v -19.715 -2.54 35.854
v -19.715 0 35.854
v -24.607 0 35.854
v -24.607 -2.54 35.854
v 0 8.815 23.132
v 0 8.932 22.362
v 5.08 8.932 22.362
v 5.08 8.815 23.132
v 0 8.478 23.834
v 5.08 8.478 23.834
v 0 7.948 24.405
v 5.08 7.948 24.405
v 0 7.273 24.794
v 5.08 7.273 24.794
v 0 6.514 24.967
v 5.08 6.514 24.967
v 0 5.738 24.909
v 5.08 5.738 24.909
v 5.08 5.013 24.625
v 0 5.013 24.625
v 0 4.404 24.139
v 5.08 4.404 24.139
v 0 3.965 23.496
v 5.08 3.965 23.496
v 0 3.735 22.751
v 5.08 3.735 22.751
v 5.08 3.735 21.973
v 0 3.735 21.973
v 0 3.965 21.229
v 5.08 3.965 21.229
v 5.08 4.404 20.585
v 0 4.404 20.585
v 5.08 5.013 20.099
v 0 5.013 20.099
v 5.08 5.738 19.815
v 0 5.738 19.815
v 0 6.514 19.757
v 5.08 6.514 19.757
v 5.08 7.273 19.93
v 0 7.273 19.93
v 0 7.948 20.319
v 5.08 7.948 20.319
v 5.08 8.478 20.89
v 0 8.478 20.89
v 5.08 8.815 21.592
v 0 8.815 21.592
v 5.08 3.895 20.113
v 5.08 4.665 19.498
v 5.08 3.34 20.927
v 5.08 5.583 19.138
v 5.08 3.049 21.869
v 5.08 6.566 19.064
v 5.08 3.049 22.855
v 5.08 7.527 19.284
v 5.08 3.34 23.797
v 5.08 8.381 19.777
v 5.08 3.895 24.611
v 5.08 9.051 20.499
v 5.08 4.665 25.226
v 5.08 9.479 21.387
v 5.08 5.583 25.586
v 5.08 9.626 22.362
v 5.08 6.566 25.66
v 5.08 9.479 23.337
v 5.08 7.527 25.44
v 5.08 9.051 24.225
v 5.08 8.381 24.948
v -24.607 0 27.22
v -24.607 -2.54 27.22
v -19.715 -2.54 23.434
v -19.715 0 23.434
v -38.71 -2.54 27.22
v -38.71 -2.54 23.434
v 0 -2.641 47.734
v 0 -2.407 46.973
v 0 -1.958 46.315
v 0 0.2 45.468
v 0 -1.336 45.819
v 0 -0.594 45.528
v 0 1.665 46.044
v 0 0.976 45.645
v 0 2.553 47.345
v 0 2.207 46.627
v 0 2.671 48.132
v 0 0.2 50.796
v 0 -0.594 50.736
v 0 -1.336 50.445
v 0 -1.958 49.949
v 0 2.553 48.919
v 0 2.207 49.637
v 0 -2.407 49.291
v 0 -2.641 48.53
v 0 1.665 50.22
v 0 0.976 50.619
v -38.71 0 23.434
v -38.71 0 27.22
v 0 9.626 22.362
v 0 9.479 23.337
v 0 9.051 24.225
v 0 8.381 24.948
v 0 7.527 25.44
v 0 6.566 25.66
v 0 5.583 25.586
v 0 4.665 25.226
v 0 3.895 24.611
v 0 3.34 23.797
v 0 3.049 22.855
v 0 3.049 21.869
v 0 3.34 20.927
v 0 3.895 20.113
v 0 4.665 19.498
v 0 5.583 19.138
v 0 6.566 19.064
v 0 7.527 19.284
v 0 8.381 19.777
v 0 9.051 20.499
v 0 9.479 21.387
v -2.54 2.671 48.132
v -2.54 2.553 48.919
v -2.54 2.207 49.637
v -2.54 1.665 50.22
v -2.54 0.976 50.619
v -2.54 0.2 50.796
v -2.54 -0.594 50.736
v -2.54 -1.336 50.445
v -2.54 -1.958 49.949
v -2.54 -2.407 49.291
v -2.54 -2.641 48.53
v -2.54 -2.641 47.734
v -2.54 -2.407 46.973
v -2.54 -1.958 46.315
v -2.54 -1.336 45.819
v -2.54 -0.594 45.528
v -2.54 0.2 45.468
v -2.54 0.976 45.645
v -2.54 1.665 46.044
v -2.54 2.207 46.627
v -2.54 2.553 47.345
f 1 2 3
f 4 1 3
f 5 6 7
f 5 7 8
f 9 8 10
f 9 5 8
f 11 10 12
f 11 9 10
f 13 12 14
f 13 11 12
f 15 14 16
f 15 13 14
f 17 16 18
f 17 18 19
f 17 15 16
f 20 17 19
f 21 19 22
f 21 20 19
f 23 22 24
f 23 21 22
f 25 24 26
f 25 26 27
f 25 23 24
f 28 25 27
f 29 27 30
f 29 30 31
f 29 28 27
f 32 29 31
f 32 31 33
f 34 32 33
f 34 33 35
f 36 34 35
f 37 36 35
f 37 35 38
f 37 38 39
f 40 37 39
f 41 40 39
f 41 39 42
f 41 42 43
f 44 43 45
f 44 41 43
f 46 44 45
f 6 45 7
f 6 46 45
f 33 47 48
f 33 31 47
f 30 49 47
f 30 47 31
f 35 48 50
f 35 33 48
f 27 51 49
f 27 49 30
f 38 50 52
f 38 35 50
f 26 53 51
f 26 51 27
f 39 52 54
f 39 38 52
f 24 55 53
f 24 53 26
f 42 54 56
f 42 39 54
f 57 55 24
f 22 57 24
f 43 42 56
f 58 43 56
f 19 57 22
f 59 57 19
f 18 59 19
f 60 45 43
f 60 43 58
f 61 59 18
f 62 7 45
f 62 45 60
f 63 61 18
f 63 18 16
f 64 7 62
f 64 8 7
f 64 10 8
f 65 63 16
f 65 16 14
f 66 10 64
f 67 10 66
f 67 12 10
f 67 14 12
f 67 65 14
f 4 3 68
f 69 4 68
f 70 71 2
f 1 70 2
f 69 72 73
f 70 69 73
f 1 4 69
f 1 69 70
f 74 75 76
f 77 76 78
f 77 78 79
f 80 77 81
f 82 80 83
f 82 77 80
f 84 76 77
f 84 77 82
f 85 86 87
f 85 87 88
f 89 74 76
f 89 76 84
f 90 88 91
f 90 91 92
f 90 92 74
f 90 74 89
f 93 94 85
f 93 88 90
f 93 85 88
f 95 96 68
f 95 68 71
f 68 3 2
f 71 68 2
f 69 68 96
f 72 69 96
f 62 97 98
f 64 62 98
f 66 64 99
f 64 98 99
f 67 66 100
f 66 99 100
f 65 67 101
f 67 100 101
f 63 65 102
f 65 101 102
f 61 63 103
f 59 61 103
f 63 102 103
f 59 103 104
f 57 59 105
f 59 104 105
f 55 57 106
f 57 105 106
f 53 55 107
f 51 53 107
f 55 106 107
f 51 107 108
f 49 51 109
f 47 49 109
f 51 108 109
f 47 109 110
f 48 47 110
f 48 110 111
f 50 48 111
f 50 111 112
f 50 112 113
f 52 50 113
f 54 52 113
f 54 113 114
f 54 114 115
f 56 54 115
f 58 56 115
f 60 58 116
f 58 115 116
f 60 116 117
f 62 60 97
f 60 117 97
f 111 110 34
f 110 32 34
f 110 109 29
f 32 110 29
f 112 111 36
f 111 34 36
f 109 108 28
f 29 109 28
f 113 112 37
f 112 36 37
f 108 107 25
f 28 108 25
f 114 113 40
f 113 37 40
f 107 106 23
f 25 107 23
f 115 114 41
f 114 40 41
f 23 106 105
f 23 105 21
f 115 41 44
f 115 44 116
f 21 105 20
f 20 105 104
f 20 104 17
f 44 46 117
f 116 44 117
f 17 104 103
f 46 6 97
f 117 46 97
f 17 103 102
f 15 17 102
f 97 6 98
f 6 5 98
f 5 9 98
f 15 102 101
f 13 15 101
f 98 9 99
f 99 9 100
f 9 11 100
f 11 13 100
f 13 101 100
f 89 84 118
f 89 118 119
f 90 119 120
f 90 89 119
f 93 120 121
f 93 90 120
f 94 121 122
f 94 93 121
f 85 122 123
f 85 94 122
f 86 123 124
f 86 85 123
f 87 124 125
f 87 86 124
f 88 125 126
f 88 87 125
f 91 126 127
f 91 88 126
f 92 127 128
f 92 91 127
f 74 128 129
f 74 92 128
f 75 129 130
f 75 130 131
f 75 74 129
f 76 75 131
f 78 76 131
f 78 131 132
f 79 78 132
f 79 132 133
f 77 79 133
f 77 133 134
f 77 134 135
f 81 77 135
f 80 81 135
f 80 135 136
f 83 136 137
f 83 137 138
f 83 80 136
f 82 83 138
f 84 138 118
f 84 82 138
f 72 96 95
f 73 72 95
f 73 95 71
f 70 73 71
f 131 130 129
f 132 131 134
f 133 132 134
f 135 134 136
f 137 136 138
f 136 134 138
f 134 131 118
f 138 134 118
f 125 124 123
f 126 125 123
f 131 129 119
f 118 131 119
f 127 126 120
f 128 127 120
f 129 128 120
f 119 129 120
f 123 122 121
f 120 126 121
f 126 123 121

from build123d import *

# Parameters (mm, degrees)
F1_DEPTH = 2.54
F2_R     = 2.671203
F3_DEPTH = 2.54
F4_R     = 3.306854
F4_R_2   = 2.612631
F5_DEPTH = 5.08


with BuildPart() as f1:
    # F0 (on Front) → F1 (new body)
    with BuildSketch(Plane.XZ):
        Polygon((-38.709875, 27.219653), (-38.709875, 23.43416), (-19.714694, 23.43416), (-19.714694, 35.853826), (-24.607392, 35.853826), (-24.607392, 31.248933), (-24.607392, 27.219653), align=None)
    extrude(amount=F1_DEPTH)


with BuildPart() as f3:
    # F2 (on Right) → F3 (new body)
    with BuildSketch(Plane.YZ):
        with Locations((0, 48.131976)):
            Circle(F2_R)
    extrude(amount=-F3_DEPTH)


with BuildPart() as f5:
    # F4 (on Right) → F5 (new body)
    with BuildSketch(Plane.YZ):
        with Locations((6.318918, 22.362098)):
            Circle(F4_R)
        with Locations((6.318918, 22.362098)):
            Circle(F4_R_2, mode=Mode.SUBTRACT)
    extrude(amount=F5_DEPTH)


solid = Compound([f1.part, f3.part, f5.part])
